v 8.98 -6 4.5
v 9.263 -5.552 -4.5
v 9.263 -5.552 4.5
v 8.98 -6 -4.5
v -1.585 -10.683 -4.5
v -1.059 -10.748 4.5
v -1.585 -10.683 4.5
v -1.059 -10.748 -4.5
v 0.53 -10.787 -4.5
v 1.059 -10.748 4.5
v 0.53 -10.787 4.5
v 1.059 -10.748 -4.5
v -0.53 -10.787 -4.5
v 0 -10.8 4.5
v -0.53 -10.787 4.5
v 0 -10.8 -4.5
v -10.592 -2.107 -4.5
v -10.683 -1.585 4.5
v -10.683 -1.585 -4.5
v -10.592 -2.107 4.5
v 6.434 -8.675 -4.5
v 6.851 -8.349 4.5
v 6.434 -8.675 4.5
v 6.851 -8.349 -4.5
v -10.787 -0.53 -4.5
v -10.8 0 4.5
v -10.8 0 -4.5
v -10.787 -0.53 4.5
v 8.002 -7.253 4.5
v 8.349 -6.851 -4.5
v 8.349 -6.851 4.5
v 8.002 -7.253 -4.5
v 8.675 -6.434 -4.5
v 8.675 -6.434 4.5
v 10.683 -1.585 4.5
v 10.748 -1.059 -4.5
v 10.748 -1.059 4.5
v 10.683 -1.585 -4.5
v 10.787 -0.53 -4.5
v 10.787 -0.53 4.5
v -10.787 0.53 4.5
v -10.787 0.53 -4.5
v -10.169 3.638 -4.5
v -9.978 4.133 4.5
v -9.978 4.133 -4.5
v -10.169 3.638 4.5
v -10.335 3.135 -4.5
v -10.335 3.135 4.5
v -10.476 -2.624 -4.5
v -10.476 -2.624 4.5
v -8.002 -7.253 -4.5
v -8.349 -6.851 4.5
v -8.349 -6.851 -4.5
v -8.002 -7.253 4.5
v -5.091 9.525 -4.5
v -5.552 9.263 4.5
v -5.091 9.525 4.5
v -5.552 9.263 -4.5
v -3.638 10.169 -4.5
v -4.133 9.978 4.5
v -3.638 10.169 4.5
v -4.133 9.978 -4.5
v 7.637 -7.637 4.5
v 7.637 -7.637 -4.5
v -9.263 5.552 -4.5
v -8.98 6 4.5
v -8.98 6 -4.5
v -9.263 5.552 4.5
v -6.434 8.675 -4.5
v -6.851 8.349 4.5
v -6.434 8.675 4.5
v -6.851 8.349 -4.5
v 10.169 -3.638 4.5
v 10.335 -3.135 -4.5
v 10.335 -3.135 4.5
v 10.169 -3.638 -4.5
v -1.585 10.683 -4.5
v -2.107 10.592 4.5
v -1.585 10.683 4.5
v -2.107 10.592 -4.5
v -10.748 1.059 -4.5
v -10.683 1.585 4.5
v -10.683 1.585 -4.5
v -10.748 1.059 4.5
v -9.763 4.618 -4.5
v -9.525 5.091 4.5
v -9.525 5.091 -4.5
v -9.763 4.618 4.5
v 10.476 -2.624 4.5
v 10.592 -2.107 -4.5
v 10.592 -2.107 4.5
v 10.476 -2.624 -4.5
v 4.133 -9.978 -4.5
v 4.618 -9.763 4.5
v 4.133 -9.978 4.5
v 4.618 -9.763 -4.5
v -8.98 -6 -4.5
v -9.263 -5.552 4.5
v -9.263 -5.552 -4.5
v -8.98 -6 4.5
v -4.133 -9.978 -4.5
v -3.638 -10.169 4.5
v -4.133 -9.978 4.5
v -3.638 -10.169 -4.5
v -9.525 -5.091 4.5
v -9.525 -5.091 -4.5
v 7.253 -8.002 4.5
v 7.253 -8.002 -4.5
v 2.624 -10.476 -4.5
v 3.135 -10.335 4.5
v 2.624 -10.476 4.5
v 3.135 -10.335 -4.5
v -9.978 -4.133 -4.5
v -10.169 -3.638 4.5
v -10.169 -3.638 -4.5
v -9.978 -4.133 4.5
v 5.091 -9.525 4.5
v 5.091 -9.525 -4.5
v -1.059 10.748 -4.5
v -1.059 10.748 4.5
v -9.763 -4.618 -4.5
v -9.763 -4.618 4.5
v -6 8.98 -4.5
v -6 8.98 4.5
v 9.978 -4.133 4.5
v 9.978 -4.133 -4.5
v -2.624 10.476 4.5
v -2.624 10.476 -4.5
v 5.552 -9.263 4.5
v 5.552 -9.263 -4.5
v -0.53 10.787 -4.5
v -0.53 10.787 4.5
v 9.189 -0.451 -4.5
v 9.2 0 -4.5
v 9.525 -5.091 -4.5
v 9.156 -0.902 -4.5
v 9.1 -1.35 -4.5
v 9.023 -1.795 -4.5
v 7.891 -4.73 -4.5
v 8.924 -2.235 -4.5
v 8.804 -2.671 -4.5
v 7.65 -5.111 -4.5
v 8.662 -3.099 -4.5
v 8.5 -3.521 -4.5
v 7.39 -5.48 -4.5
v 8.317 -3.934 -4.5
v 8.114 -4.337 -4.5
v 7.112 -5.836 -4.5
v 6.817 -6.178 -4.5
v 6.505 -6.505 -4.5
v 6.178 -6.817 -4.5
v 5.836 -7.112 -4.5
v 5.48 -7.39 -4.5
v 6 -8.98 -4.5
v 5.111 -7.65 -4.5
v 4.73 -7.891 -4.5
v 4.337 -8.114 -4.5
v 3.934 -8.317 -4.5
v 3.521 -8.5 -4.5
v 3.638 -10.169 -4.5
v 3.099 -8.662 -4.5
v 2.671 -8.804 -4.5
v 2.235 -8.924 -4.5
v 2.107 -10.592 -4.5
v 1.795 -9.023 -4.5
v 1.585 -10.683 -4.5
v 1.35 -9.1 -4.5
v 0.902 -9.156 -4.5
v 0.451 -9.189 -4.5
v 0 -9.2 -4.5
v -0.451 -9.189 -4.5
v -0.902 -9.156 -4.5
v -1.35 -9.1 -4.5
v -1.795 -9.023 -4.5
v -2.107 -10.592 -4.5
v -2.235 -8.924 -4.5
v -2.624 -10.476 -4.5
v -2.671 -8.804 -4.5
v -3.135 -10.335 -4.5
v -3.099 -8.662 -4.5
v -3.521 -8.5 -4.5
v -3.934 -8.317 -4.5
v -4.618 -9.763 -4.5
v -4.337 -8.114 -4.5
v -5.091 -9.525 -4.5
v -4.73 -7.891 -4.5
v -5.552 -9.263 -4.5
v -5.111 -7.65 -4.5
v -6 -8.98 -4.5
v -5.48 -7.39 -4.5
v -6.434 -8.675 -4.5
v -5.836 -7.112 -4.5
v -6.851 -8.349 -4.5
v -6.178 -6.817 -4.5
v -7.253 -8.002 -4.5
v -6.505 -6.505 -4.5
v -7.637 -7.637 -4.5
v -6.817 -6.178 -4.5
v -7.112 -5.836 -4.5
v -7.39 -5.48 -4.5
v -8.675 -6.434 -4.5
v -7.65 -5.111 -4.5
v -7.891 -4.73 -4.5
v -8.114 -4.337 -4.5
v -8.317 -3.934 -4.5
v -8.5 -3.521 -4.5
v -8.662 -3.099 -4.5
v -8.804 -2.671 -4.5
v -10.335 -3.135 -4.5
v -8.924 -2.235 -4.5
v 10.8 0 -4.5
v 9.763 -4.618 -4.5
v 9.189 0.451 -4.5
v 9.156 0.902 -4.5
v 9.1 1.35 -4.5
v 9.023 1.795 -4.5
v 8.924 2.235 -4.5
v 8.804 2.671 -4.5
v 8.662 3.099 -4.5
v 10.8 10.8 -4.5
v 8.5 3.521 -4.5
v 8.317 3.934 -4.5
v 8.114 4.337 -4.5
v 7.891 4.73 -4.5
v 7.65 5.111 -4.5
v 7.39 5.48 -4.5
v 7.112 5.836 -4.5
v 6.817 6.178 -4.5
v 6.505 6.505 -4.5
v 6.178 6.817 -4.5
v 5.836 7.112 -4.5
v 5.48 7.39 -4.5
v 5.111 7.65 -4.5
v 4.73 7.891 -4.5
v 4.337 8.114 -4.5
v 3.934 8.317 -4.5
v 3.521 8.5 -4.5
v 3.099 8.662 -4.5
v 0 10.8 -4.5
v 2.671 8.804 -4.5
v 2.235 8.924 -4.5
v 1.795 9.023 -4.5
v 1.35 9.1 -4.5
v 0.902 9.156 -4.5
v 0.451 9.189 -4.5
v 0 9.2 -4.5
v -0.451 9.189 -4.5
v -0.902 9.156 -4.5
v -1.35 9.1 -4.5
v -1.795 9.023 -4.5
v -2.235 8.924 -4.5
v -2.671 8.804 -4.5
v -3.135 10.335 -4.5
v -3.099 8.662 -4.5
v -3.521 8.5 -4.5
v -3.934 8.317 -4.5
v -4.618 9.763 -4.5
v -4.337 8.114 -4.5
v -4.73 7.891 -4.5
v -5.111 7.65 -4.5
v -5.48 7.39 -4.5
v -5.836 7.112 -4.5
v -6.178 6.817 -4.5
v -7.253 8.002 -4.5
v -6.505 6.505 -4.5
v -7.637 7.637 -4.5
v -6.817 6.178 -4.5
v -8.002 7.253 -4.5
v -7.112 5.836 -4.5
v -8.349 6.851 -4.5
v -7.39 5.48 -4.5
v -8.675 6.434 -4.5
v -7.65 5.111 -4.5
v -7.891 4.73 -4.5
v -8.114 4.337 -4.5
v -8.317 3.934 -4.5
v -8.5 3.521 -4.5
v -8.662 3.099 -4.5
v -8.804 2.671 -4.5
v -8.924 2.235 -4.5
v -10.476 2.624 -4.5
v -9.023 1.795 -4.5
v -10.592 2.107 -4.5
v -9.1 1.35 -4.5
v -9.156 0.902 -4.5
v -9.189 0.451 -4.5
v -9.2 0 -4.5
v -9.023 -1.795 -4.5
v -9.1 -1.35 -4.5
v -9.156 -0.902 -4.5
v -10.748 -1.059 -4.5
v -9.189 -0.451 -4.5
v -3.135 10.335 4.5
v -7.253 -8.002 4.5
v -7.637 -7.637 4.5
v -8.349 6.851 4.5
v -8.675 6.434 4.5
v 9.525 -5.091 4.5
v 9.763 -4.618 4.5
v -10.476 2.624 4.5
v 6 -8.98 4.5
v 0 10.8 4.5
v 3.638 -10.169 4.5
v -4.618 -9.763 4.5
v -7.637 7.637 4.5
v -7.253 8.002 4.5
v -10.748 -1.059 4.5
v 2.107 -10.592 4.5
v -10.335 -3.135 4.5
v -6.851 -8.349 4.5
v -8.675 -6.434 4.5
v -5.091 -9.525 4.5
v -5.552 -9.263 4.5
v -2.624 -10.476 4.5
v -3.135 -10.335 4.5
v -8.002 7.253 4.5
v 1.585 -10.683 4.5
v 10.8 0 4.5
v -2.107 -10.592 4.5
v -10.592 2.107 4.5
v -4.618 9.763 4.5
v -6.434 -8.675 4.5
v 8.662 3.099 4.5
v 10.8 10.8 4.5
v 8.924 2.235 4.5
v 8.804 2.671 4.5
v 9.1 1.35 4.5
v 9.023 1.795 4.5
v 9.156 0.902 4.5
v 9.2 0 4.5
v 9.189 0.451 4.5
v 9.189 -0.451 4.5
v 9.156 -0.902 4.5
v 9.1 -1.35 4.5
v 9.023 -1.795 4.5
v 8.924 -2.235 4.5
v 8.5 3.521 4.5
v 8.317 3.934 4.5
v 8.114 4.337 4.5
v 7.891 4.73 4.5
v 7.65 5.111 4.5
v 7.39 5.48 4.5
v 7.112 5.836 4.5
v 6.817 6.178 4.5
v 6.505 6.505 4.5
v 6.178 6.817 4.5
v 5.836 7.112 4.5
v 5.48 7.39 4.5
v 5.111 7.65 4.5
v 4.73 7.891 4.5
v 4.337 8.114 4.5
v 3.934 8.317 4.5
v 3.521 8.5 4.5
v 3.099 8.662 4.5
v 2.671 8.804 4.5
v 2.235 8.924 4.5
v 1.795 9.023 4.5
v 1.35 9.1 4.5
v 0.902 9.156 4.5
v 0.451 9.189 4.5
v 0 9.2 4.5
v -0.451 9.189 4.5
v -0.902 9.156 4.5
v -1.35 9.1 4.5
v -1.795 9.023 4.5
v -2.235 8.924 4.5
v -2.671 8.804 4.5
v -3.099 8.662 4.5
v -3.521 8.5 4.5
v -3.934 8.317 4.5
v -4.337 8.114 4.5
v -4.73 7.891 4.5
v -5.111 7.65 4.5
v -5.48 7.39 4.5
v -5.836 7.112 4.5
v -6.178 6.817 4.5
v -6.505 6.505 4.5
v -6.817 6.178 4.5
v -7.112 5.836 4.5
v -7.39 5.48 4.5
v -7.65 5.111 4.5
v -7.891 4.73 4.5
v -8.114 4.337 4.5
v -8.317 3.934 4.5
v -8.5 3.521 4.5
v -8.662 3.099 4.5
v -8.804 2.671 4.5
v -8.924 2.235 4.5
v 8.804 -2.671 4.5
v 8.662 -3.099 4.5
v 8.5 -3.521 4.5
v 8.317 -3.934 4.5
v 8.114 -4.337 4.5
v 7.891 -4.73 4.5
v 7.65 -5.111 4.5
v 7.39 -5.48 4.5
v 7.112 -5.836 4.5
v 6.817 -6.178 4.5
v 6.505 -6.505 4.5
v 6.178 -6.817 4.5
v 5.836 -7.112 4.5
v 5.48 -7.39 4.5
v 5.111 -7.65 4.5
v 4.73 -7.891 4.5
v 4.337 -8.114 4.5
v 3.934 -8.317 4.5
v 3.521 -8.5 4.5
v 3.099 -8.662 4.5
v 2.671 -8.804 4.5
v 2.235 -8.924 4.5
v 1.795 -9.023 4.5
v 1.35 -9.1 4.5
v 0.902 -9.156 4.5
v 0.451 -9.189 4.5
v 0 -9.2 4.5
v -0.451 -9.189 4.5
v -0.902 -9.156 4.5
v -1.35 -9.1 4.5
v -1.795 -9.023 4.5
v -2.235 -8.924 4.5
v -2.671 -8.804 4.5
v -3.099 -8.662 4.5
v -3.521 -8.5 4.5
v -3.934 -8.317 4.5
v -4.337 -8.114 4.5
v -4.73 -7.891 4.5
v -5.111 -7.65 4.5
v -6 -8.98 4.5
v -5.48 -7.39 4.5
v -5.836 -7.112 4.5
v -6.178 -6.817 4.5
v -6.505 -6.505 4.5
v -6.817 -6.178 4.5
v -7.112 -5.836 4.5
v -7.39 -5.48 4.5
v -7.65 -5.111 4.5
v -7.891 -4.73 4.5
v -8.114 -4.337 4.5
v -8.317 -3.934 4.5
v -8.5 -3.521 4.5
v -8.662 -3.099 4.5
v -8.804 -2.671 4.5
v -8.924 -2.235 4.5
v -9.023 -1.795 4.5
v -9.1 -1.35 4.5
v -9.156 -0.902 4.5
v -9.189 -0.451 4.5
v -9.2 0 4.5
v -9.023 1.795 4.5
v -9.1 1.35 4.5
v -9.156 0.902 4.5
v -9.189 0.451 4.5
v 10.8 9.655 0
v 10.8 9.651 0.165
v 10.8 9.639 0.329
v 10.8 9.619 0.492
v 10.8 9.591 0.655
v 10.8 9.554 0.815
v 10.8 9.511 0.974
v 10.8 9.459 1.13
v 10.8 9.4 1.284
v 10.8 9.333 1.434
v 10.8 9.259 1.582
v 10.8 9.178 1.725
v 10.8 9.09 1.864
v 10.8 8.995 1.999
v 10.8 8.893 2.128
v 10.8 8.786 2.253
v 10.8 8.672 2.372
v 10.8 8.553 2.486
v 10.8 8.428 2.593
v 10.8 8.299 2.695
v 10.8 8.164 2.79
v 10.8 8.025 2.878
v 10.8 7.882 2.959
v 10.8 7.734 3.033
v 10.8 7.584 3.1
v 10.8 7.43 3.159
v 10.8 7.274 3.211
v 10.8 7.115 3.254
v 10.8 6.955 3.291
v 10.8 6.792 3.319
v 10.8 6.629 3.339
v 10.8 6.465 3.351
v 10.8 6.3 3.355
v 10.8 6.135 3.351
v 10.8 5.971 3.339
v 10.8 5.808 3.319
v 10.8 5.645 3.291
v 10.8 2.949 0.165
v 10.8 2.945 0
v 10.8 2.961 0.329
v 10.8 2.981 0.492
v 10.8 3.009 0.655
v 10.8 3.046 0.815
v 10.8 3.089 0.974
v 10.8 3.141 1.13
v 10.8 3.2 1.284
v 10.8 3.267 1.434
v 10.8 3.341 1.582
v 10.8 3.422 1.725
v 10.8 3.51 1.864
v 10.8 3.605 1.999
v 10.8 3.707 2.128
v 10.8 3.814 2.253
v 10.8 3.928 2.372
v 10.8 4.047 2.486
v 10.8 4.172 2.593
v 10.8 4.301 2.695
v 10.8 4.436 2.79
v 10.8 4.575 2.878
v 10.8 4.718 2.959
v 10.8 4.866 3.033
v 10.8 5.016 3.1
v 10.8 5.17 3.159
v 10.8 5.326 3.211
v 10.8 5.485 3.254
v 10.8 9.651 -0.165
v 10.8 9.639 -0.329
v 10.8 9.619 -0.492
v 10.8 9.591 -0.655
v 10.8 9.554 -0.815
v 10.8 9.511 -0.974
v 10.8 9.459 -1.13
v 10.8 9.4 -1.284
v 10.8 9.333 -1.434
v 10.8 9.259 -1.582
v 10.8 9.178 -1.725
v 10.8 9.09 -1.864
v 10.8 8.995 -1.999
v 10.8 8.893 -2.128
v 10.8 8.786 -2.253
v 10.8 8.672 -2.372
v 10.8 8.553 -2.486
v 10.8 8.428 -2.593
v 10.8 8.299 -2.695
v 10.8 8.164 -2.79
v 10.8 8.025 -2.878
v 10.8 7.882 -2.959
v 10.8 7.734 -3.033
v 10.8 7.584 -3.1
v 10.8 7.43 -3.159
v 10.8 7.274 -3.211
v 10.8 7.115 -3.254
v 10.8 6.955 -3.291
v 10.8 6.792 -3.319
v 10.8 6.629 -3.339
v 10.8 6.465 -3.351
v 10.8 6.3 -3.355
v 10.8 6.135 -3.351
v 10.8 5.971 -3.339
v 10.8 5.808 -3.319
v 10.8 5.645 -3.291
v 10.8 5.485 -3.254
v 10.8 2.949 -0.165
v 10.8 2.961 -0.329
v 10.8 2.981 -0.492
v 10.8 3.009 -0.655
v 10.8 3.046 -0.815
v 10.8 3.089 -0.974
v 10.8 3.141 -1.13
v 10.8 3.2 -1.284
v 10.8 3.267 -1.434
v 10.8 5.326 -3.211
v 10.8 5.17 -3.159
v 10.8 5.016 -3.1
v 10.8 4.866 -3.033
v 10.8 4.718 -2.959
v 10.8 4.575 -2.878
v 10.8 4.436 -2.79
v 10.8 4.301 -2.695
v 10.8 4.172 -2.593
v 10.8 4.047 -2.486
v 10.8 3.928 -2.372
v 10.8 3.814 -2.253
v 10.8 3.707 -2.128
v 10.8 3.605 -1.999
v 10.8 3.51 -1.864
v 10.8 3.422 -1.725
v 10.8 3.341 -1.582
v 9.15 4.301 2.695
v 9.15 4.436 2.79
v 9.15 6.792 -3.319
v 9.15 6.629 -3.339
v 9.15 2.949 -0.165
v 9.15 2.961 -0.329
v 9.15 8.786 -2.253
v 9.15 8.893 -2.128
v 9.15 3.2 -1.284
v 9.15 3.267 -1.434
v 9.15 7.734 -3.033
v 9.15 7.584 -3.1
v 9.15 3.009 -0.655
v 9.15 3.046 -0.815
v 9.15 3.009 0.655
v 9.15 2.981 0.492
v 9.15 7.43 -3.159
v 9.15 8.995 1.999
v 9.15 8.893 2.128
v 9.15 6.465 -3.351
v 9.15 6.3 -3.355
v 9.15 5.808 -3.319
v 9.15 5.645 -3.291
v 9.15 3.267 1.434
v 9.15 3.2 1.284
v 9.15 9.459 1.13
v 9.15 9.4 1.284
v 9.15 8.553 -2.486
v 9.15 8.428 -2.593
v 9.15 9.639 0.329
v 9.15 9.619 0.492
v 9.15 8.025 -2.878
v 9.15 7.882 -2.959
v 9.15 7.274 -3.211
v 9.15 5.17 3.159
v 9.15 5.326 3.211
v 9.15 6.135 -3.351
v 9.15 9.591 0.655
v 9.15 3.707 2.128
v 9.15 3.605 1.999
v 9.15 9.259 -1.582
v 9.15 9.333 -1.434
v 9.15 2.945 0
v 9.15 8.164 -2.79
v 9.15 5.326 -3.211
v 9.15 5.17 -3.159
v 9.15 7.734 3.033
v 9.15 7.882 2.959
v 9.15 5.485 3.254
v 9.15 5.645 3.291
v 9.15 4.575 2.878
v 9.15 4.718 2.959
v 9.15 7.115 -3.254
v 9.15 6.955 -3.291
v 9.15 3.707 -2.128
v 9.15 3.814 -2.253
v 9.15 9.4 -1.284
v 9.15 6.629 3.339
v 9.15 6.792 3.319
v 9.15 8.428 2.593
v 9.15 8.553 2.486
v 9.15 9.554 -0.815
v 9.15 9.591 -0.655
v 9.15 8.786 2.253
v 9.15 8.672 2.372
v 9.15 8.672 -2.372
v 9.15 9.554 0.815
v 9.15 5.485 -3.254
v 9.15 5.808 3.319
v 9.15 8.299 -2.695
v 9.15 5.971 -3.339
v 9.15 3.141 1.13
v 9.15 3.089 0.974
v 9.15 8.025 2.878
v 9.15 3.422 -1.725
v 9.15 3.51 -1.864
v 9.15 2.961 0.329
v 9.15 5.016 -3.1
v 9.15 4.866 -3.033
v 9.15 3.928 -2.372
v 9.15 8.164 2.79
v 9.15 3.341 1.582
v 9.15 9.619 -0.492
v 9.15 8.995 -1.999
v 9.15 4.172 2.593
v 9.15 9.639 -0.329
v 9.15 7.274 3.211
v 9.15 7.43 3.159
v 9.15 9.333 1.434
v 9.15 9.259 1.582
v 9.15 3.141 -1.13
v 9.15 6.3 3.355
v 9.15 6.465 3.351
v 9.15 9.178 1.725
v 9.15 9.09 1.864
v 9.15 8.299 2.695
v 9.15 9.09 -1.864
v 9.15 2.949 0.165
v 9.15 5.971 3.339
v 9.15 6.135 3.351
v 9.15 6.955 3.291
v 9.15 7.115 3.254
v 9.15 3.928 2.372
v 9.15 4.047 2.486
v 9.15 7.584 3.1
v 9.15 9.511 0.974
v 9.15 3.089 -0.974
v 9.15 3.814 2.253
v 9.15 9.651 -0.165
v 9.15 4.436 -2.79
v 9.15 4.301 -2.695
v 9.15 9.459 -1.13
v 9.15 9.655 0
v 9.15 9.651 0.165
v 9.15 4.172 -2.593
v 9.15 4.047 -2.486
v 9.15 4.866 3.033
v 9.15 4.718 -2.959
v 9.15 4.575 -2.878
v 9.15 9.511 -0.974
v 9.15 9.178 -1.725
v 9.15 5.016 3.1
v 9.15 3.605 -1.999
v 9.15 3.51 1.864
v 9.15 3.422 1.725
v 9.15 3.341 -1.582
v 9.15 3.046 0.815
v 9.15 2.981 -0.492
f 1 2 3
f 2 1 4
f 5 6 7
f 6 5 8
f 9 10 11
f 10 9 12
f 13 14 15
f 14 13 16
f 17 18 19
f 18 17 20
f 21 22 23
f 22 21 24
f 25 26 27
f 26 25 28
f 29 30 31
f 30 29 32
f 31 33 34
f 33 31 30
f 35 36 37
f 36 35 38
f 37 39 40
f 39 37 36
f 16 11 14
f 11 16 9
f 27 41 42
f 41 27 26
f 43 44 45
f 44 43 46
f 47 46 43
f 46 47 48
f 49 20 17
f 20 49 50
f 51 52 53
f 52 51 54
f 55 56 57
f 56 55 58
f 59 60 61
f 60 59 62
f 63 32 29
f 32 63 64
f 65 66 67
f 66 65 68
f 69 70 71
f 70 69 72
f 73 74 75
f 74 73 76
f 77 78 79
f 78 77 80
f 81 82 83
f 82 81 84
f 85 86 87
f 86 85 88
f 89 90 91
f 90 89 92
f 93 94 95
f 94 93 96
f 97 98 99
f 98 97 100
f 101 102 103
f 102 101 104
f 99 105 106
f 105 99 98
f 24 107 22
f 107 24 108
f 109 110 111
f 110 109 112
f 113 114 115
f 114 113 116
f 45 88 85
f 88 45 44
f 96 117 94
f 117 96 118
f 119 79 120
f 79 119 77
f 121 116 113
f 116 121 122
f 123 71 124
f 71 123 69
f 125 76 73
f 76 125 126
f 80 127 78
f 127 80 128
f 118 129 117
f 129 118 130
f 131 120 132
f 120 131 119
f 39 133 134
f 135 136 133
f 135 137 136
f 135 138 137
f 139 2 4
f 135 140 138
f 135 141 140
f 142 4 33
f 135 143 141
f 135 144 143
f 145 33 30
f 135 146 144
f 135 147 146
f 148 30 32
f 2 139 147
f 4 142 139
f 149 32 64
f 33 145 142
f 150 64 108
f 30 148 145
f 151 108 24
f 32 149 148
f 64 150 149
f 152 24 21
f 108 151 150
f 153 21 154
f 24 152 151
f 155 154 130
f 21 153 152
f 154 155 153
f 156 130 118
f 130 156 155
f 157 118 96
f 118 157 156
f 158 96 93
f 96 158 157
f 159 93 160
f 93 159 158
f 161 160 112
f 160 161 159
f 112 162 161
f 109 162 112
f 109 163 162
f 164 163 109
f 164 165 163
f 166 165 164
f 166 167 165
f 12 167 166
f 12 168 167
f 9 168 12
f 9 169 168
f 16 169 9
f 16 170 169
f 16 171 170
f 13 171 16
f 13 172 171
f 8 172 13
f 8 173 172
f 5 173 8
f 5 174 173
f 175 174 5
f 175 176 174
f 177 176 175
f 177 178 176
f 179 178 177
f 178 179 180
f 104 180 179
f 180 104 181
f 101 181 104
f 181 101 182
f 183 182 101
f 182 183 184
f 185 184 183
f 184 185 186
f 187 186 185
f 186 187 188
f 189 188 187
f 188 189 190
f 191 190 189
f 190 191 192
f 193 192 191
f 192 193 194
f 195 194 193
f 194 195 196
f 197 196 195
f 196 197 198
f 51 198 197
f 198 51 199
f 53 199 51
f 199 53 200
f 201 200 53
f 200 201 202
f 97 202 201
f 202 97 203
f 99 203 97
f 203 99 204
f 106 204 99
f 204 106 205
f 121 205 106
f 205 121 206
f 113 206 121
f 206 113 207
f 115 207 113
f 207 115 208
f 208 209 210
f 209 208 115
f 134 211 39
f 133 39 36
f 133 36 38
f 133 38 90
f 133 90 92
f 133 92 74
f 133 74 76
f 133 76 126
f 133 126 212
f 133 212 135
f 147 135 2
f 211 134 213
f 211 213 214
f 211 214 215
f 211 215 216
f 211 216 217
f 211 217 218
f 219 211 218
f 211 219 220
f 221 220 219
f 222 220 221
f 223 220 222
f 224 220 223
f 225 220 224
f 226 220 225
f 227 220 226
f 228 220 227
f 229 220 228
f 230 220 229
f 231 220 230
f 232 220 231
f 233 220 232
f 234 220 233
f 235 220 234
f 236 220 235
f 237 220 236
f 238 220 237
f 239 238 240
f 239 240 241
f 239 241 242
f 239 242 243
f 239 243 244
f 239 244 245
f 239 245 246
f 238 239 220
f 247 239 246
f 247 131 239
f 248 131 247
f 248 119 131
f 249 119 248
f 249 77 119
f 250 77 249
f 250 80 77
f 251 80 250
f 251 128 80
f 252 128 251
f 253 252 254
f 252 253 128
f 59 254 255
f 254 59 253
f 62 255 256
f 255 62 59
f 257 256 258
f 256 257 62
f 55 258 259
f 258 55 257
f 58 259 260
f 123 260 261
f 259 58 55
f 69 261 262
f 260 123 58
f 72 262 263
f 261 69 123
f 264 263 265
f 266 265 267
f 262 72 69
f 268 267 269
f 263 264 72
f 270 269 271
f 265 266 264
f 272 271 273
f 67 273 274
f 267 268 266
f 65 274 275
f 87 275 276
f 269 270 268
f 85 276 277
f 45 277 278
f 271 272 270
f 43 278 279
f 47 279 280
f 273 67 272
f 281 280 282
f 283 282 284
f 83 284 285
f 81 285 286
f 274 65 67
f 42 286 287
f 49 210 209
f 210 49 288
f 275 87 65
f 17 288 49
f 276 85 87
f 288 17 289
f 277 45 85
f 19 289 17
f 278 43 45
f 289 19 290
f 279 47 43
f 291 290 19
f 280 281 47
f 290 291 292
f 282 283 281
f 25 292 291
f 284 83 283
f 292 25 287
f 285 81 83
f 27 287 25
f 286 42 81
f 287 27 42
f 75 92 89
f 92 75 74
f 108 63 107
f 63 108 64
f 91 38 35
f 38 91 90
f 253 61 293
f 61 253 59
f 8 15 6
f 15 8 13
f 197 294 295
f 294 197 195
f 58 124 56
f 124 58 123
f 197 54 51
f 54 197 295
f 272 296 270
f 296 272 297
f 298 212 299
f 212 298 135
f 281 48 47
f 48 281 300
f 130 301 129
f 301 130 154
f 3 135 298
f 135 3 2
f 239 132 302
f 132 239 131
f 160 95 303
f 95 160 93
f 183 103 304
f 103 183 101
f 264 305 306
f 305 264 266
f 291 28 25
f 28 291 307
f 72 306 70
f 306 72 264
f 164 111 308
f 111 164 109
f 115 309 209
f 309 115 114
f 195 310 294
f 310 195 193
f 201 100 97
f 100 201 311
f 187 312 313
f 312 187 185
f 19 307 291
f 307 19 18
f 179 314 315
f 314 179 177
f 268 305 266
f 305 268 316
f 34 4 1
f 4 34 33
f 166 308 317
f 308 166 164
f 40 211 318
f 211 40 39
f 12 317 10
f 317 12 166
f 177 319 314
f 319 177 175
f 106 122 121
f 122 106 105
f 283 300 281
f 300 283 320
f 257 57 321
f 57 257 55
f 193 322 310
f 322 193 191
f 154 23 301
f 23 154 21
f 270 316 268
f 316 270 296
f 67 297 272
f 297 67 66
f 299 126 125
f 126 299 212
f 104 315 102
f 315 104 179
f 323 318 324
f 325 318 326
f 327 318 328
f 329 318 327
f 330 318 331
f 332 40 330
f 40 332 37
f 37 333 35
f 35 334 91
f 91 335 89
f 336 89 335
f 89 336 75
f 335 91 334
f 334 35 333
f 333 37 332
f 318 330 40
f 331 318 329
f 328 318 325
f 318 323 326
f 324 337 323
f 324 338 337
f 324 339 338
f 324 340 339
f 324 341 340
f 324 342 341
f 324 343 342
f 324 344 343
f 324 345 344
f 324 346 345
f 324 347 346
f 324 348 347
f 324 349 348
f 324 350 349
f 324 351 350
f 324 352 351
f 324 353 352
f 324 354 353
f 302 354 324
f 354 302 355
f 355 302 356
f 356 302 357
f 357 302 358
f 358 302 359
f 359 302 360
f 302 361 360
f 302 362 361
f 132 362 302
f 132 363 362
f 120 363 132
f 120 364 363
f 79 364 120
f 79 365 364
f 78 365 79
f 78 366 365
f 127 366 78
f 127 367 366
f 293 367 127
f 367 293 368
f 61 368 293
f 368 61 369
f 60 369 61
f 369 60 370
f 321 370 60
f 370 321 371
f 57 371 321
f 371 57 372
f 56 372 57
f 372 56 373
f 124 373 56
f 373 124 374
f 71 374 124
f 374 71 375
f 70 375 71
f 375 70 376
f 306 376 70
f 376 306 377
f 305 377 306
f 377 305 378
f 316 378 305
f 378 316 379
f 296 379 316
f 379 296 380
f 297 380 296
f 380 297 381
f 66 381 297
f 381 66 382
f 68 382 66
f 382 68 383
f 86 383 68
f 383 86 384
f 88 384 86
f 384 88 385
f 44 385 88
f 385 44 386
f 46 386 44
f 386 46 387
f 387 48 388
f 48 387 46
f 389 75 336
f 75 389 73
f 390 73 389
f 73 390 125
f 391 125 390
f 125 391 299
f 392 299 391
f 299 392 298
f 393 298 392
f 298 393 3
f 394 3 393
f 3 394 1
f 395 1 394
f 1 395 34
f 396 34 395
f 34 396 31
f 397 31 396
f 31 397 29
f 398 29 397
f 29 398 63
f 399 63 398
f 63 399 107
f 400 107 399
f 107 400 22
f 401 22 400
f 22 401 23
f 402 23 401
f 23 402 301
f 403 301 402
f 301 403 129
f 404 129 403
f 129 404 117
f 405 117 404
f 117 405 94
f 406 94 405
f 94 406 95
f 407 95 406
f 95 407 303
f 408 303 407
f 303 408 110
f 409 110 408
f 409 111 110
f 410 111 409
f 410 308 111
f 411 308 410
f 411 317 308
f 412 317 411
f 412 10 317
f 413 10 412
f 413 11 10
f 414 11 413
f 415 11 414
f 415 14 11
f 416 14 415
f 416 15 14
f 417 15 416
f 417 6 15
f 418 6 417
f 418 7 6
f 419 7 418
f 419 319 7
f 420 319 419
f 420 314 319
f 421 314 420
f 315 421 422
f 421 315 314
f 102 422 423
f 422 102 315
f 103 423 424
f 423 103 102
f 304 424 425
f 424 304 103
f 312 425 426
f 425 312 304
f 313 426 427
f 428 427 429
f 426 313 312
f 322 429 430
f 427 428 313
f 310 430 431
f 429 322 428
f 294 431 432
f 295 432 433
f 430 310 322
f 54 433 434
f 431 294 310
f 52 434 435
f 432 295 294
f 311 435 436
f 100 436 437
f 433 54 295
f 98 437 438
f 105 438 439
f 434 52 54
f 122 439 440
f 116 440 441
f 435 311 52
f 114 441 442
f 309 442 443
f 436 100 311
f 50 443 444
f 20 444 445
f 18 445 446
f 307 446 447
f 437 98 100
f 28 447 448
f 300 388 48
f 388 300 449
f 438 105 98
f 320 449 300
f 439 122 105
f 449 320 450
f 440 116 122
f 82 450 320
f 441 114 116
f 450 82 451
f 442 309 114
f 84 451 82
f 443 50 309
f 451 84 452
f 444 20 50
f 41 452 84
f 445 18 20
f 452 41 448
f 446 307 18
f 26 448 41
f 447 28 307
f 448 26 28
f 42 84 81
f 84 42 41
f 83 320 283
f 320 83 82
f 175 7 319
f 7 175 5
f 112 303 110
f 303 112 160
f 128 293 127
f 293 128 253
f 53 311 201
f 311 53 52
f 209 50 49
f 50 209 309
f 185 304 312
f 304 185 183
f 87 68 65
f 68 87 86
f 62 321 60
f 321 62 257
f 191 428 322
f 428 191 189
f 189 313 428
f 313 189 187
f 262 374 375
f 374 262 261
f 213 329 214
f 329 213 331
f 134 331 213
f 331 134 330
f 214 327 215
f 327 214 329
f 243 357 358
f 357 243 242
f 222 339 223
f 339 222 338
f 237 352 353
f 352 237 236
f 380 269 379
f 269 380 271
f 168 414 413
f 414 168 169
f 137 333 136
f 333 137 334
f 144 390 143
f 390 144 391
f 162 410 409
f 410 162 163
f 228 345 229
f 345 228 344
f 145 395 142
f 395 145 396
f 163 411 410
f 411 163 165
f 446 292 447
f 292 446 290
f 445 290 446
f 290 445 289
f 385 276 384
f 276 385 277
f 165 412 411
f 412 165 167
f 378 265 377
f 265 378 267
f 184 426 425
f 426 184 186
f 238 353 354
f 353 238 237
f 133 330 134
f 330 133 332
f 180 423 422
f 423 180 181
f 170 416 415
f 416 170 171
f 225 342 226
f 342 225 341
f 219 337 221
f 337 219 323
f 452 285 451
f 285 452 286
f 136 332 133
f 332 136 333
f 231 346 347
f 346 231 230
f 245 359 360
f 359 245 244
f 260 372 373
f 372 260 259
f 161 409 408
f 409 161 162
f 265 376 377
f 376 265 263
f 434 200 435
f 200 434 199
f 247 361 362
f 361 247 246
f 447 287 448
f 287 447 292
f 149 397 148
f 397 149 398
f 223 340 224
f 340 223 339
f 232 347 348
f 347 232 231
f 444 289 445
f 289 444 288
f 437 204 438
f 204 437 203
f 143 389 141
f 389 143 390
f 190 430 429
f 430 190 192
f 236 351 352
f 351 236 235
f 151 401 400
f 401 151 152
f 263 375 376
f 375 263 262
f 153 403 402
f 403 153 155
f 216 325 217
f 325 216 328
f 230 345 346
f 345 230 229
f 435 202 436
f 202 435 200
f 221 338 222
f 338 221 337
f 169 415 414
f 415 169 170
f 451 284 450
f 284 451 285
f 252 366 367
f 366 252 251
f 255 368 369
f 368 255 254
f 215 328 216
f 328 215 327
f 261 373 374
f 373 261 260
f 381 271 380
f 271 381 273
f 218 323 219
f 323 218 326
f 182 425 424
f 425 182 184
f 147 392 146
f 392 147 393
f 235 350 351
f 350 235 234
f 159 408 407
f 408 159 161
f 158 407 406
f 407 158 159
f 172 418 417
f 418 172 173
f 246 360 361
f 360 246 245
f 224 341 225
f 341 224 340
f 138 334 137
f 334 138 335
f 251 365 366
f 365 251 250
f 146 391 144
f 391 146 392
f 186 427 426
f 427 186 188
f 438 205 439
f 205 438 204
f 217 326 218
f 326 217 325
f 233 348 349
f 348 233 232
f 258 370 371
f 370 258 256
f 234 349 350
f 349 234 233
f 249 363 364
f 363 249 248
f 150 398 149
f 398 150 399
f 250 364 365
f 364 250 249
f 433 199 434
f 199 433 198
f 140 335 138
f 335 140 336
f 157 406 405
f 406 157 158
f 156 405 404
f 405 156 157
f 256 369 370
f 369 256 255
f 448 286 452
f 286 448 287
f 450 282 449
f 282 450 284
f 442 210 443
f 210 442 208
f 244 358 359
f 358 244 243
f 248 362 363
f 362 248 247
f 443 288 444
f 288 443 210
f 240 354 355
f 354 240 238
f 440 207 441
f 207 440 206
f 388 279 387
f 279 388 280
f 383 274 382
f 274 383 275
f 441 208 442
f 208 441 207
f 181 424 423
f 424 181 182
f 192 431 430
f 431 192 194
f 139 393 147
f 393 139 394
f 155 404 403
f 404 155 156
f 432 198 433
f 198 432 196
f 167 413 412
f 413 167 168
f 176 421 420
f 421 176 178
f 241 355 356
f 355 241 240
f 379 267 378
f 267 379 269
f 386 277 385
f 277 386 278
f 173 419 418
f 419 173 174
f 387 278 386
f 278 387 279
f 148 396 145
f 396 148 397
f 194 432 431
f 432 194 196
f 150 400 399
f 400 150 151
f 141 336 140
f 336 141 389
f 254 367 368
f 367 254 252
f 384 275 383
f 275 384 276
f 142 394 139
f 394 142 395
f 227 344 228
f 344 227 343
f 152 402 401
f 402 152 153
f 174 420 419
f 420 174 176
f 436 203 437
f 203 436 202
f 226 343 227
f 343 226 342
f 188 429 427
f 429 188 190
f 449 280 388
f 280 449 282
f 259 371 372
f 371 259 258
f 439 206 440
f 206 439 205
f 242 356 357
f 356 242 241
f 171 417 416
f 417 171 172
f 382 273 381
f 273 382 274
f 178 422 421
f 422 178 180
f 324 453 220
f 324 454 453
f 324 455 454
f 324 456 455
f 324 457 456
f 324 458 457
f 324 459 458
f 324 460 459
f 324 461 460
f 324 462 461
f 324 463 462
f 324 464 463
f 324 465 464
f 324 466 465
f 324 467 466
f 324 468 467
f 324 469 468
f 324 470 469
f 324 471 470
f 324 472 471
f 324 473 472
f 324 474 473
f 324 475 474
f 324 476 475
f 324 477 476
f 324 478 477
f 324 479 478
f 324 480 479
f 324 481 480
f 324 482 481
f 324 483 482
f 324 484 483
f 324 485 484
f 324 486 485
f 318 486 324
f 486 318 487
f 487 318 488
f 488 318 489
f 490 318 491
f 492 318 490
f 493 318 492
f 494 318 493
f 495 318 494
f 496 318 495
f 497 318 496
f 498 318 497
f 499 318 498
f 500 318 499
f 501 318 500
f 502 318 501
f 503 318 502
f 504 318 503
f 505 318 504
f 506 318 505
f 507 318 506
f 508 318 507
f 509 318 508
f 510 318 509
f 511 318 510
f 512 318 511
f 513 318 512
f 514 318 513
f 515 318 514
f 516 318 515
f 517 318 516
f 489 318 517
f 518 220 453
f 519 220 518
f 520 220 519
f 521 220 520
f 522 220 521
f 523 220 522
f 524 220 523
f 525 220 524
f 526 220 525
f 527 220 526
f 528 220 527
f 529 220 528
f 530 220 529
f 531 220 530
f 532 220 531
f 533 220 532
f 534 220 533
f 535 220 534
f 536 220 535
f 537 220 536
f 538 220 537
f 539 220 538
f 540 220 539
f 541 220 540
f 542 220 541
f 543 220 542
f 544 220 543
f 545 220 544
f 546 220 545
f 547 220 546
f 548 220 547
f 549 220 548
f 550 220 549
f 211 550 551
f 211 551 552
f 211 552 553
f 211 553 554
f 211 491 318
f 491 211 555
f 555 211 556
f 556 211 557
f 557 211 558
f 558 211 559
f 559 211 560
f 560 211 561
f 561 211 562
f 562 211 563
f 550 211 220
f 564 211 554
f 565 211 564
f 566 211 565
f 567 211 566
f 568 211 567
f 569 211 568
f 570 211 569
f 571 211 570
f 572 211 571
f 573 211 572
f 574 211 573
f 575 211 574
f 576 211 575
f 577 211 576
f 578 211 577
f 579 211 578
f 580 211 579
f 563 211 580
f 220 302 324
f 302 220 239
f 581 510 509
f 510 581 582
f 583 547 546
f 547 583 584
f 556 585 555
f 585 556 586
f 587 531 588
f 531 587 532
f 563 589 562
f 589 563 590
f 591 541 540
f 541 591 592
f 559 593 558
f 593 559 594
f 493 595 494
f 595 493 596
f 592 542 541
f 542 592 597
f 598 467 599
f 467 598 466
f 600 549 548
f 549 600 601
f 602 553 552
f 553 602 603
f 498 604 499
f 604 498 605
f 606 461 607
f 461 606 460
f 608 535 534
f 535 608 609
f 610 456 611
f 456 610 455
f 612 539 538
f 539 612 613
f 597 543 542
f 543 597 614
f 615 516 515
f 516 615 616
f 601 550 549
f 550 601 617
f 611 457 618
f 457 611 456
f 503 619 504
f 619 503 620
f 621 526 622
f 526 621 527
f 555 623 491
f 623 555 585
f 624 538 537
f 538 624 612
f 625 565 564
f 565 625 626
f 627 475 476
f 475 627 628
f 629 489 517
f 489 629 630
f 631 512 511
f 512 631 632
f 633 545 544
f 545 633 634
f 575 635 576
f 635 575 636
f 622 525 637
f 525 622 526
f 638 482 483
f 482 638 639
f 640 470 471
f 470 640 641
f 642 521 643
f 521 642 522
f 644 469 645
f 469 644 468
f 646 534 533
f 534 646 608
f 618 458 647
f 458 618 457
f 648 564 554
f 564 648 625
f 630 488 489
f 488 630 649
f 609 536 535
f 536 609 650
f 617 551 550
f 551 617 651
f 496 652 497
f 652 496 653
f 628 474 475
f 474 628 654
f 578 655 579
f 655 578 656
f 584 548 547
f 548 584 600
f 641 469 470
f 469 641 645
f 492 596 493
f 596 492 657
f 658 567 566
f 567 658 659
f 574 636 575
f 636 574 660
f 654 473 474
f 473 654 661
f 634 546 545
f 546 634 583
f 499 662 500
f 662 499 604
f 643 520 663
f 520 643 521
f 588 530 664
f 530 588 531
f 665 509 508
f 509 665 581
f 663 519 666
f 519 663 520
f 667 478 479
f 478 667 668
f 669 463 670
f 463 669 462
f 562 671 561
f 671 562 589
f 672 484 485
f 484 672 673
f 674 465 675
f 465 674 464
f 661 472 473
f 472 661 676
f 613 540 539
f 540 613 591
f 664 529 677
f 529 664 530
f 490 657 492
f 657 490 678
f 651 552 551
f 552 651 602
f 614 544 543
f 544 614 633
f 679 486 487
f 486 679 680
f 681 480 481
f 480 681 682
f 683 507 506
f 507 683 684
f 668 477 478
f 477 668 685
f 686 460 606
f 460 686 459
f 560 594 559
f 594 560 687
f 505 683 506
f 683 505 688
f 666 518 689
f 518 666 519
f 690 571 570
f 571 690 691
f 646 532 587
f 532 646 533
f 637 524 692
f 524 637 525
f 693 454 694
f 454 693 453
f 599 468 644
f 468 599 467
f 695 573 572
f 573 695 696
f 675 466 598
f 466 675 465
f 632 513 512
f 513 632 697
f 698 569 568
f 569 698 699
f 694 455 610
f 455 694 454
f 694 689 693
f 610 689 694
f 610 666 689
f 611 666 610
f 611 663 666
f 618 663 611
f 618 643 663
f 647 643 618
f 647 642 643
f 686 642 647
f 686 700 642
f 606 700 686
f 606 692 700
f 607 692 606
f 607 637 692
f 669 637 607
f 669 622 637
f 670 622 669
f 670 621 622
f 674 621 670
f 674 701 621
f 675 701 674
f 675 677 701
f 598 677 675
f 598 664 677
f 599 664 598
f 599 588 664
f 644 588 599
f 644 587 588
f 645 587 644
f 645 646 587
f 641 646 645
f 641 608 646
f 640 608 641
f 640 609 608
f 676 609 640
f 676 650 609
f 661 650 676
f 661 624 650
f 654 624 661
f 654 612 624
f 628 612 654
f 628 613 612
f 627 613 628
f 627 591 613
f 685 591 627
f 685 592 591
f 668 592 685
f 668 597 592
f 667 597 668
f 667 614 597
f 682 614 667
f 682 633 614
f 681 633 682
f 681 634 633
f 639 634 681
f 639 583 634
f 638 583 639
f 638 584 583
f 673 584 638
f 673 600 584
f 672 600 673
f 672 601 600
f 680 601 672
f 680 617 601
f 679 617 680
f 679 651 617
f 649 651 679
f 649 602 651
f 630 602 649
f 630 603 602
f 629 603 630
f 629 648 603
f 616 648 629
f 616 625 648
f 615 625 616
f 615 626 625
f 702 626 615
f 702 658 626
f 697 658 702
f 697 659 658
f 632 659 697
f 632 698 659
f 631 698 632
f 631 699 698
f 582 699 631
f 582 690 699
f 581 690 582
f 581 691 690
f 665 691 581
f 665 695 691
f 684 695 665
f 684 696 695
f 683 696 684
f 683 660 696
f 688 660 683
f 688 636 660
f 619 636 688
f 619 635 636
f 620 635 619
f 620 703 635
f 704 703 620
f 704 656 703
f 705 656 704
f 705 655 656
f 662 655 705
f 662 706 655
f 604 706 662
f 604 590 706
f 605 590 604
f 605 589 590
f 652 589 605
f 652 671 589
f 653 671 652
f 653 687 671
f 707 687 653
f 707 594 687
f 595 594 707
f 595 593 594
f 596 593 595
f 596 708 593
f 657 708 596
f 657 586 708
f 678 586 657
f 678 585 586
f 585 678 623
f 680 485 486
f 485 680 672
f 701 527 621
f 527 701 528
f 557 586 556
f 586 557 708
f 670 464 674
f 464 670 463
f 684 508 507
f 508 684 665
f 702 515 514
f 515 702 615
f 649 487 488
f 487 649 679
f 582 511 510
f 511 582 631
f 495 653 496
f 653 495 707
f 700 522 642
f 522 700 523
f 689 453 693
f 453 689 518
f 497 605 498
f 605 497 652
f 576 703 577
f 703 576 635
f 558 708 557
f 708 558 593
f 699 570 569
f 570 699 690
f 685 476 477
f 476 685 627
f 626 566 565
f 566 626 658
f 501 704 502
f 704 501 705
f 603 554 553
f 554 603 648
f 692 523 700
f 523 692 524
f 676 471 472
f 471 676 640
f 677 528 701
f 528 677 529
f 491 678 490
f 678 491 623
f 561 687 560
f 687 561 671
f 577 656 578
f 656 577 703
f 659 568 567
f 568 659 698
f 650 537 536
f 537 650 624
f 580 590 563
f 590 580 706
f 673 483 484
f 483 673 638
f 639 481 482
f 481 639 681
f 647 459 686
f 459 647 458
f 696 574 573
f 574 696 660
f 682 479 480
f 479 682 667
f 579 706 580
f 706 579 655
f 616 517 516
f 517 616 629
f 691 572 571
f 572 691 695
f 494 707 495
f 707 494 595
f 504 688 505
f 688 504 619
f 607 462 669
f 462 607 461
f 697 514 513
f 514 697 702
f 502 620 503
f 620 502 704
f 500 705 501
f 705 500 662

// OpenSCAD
$fn = 128;
ring_inner=9.2;
ring_width=9;
ring_thickness=1.6;
ring_outer=ring_inner+ring_thickness;
ring_block = ring_outer;
magnet_radius = 3.355;
magnet_height= 1.65;
magnet_margin = (ring_width-magnet_radius*2)/2;




module ring() {
    difference() {
        cylinder(h = ring_width,r = ring_outer, center = true);
        cylinder(h = ring_width*1.4,r = ring_inner, center = true);
        
    };
};

module block(){
    difference() {
        translate([0,0,ring_width/2*-1]) 
            cube([ring_block, ring_block, ring_width]);
        cylinder(h = ring_width*1.4,r = ring_inner, center = true);

    };
};


     
module ringBlock(){
    union(){
        ring();
        block();
    };
};


module finalRing(){
    difference(){
        ringBlock();
        rotate([0,90,0])
            translate ([0,ring_outer-magnet_radius-magnet_margin,ring_outer-magnet_height]) 
                cylinder(h = magnet_height+1, r = magnet_radius);
    };
};


finalRing();
